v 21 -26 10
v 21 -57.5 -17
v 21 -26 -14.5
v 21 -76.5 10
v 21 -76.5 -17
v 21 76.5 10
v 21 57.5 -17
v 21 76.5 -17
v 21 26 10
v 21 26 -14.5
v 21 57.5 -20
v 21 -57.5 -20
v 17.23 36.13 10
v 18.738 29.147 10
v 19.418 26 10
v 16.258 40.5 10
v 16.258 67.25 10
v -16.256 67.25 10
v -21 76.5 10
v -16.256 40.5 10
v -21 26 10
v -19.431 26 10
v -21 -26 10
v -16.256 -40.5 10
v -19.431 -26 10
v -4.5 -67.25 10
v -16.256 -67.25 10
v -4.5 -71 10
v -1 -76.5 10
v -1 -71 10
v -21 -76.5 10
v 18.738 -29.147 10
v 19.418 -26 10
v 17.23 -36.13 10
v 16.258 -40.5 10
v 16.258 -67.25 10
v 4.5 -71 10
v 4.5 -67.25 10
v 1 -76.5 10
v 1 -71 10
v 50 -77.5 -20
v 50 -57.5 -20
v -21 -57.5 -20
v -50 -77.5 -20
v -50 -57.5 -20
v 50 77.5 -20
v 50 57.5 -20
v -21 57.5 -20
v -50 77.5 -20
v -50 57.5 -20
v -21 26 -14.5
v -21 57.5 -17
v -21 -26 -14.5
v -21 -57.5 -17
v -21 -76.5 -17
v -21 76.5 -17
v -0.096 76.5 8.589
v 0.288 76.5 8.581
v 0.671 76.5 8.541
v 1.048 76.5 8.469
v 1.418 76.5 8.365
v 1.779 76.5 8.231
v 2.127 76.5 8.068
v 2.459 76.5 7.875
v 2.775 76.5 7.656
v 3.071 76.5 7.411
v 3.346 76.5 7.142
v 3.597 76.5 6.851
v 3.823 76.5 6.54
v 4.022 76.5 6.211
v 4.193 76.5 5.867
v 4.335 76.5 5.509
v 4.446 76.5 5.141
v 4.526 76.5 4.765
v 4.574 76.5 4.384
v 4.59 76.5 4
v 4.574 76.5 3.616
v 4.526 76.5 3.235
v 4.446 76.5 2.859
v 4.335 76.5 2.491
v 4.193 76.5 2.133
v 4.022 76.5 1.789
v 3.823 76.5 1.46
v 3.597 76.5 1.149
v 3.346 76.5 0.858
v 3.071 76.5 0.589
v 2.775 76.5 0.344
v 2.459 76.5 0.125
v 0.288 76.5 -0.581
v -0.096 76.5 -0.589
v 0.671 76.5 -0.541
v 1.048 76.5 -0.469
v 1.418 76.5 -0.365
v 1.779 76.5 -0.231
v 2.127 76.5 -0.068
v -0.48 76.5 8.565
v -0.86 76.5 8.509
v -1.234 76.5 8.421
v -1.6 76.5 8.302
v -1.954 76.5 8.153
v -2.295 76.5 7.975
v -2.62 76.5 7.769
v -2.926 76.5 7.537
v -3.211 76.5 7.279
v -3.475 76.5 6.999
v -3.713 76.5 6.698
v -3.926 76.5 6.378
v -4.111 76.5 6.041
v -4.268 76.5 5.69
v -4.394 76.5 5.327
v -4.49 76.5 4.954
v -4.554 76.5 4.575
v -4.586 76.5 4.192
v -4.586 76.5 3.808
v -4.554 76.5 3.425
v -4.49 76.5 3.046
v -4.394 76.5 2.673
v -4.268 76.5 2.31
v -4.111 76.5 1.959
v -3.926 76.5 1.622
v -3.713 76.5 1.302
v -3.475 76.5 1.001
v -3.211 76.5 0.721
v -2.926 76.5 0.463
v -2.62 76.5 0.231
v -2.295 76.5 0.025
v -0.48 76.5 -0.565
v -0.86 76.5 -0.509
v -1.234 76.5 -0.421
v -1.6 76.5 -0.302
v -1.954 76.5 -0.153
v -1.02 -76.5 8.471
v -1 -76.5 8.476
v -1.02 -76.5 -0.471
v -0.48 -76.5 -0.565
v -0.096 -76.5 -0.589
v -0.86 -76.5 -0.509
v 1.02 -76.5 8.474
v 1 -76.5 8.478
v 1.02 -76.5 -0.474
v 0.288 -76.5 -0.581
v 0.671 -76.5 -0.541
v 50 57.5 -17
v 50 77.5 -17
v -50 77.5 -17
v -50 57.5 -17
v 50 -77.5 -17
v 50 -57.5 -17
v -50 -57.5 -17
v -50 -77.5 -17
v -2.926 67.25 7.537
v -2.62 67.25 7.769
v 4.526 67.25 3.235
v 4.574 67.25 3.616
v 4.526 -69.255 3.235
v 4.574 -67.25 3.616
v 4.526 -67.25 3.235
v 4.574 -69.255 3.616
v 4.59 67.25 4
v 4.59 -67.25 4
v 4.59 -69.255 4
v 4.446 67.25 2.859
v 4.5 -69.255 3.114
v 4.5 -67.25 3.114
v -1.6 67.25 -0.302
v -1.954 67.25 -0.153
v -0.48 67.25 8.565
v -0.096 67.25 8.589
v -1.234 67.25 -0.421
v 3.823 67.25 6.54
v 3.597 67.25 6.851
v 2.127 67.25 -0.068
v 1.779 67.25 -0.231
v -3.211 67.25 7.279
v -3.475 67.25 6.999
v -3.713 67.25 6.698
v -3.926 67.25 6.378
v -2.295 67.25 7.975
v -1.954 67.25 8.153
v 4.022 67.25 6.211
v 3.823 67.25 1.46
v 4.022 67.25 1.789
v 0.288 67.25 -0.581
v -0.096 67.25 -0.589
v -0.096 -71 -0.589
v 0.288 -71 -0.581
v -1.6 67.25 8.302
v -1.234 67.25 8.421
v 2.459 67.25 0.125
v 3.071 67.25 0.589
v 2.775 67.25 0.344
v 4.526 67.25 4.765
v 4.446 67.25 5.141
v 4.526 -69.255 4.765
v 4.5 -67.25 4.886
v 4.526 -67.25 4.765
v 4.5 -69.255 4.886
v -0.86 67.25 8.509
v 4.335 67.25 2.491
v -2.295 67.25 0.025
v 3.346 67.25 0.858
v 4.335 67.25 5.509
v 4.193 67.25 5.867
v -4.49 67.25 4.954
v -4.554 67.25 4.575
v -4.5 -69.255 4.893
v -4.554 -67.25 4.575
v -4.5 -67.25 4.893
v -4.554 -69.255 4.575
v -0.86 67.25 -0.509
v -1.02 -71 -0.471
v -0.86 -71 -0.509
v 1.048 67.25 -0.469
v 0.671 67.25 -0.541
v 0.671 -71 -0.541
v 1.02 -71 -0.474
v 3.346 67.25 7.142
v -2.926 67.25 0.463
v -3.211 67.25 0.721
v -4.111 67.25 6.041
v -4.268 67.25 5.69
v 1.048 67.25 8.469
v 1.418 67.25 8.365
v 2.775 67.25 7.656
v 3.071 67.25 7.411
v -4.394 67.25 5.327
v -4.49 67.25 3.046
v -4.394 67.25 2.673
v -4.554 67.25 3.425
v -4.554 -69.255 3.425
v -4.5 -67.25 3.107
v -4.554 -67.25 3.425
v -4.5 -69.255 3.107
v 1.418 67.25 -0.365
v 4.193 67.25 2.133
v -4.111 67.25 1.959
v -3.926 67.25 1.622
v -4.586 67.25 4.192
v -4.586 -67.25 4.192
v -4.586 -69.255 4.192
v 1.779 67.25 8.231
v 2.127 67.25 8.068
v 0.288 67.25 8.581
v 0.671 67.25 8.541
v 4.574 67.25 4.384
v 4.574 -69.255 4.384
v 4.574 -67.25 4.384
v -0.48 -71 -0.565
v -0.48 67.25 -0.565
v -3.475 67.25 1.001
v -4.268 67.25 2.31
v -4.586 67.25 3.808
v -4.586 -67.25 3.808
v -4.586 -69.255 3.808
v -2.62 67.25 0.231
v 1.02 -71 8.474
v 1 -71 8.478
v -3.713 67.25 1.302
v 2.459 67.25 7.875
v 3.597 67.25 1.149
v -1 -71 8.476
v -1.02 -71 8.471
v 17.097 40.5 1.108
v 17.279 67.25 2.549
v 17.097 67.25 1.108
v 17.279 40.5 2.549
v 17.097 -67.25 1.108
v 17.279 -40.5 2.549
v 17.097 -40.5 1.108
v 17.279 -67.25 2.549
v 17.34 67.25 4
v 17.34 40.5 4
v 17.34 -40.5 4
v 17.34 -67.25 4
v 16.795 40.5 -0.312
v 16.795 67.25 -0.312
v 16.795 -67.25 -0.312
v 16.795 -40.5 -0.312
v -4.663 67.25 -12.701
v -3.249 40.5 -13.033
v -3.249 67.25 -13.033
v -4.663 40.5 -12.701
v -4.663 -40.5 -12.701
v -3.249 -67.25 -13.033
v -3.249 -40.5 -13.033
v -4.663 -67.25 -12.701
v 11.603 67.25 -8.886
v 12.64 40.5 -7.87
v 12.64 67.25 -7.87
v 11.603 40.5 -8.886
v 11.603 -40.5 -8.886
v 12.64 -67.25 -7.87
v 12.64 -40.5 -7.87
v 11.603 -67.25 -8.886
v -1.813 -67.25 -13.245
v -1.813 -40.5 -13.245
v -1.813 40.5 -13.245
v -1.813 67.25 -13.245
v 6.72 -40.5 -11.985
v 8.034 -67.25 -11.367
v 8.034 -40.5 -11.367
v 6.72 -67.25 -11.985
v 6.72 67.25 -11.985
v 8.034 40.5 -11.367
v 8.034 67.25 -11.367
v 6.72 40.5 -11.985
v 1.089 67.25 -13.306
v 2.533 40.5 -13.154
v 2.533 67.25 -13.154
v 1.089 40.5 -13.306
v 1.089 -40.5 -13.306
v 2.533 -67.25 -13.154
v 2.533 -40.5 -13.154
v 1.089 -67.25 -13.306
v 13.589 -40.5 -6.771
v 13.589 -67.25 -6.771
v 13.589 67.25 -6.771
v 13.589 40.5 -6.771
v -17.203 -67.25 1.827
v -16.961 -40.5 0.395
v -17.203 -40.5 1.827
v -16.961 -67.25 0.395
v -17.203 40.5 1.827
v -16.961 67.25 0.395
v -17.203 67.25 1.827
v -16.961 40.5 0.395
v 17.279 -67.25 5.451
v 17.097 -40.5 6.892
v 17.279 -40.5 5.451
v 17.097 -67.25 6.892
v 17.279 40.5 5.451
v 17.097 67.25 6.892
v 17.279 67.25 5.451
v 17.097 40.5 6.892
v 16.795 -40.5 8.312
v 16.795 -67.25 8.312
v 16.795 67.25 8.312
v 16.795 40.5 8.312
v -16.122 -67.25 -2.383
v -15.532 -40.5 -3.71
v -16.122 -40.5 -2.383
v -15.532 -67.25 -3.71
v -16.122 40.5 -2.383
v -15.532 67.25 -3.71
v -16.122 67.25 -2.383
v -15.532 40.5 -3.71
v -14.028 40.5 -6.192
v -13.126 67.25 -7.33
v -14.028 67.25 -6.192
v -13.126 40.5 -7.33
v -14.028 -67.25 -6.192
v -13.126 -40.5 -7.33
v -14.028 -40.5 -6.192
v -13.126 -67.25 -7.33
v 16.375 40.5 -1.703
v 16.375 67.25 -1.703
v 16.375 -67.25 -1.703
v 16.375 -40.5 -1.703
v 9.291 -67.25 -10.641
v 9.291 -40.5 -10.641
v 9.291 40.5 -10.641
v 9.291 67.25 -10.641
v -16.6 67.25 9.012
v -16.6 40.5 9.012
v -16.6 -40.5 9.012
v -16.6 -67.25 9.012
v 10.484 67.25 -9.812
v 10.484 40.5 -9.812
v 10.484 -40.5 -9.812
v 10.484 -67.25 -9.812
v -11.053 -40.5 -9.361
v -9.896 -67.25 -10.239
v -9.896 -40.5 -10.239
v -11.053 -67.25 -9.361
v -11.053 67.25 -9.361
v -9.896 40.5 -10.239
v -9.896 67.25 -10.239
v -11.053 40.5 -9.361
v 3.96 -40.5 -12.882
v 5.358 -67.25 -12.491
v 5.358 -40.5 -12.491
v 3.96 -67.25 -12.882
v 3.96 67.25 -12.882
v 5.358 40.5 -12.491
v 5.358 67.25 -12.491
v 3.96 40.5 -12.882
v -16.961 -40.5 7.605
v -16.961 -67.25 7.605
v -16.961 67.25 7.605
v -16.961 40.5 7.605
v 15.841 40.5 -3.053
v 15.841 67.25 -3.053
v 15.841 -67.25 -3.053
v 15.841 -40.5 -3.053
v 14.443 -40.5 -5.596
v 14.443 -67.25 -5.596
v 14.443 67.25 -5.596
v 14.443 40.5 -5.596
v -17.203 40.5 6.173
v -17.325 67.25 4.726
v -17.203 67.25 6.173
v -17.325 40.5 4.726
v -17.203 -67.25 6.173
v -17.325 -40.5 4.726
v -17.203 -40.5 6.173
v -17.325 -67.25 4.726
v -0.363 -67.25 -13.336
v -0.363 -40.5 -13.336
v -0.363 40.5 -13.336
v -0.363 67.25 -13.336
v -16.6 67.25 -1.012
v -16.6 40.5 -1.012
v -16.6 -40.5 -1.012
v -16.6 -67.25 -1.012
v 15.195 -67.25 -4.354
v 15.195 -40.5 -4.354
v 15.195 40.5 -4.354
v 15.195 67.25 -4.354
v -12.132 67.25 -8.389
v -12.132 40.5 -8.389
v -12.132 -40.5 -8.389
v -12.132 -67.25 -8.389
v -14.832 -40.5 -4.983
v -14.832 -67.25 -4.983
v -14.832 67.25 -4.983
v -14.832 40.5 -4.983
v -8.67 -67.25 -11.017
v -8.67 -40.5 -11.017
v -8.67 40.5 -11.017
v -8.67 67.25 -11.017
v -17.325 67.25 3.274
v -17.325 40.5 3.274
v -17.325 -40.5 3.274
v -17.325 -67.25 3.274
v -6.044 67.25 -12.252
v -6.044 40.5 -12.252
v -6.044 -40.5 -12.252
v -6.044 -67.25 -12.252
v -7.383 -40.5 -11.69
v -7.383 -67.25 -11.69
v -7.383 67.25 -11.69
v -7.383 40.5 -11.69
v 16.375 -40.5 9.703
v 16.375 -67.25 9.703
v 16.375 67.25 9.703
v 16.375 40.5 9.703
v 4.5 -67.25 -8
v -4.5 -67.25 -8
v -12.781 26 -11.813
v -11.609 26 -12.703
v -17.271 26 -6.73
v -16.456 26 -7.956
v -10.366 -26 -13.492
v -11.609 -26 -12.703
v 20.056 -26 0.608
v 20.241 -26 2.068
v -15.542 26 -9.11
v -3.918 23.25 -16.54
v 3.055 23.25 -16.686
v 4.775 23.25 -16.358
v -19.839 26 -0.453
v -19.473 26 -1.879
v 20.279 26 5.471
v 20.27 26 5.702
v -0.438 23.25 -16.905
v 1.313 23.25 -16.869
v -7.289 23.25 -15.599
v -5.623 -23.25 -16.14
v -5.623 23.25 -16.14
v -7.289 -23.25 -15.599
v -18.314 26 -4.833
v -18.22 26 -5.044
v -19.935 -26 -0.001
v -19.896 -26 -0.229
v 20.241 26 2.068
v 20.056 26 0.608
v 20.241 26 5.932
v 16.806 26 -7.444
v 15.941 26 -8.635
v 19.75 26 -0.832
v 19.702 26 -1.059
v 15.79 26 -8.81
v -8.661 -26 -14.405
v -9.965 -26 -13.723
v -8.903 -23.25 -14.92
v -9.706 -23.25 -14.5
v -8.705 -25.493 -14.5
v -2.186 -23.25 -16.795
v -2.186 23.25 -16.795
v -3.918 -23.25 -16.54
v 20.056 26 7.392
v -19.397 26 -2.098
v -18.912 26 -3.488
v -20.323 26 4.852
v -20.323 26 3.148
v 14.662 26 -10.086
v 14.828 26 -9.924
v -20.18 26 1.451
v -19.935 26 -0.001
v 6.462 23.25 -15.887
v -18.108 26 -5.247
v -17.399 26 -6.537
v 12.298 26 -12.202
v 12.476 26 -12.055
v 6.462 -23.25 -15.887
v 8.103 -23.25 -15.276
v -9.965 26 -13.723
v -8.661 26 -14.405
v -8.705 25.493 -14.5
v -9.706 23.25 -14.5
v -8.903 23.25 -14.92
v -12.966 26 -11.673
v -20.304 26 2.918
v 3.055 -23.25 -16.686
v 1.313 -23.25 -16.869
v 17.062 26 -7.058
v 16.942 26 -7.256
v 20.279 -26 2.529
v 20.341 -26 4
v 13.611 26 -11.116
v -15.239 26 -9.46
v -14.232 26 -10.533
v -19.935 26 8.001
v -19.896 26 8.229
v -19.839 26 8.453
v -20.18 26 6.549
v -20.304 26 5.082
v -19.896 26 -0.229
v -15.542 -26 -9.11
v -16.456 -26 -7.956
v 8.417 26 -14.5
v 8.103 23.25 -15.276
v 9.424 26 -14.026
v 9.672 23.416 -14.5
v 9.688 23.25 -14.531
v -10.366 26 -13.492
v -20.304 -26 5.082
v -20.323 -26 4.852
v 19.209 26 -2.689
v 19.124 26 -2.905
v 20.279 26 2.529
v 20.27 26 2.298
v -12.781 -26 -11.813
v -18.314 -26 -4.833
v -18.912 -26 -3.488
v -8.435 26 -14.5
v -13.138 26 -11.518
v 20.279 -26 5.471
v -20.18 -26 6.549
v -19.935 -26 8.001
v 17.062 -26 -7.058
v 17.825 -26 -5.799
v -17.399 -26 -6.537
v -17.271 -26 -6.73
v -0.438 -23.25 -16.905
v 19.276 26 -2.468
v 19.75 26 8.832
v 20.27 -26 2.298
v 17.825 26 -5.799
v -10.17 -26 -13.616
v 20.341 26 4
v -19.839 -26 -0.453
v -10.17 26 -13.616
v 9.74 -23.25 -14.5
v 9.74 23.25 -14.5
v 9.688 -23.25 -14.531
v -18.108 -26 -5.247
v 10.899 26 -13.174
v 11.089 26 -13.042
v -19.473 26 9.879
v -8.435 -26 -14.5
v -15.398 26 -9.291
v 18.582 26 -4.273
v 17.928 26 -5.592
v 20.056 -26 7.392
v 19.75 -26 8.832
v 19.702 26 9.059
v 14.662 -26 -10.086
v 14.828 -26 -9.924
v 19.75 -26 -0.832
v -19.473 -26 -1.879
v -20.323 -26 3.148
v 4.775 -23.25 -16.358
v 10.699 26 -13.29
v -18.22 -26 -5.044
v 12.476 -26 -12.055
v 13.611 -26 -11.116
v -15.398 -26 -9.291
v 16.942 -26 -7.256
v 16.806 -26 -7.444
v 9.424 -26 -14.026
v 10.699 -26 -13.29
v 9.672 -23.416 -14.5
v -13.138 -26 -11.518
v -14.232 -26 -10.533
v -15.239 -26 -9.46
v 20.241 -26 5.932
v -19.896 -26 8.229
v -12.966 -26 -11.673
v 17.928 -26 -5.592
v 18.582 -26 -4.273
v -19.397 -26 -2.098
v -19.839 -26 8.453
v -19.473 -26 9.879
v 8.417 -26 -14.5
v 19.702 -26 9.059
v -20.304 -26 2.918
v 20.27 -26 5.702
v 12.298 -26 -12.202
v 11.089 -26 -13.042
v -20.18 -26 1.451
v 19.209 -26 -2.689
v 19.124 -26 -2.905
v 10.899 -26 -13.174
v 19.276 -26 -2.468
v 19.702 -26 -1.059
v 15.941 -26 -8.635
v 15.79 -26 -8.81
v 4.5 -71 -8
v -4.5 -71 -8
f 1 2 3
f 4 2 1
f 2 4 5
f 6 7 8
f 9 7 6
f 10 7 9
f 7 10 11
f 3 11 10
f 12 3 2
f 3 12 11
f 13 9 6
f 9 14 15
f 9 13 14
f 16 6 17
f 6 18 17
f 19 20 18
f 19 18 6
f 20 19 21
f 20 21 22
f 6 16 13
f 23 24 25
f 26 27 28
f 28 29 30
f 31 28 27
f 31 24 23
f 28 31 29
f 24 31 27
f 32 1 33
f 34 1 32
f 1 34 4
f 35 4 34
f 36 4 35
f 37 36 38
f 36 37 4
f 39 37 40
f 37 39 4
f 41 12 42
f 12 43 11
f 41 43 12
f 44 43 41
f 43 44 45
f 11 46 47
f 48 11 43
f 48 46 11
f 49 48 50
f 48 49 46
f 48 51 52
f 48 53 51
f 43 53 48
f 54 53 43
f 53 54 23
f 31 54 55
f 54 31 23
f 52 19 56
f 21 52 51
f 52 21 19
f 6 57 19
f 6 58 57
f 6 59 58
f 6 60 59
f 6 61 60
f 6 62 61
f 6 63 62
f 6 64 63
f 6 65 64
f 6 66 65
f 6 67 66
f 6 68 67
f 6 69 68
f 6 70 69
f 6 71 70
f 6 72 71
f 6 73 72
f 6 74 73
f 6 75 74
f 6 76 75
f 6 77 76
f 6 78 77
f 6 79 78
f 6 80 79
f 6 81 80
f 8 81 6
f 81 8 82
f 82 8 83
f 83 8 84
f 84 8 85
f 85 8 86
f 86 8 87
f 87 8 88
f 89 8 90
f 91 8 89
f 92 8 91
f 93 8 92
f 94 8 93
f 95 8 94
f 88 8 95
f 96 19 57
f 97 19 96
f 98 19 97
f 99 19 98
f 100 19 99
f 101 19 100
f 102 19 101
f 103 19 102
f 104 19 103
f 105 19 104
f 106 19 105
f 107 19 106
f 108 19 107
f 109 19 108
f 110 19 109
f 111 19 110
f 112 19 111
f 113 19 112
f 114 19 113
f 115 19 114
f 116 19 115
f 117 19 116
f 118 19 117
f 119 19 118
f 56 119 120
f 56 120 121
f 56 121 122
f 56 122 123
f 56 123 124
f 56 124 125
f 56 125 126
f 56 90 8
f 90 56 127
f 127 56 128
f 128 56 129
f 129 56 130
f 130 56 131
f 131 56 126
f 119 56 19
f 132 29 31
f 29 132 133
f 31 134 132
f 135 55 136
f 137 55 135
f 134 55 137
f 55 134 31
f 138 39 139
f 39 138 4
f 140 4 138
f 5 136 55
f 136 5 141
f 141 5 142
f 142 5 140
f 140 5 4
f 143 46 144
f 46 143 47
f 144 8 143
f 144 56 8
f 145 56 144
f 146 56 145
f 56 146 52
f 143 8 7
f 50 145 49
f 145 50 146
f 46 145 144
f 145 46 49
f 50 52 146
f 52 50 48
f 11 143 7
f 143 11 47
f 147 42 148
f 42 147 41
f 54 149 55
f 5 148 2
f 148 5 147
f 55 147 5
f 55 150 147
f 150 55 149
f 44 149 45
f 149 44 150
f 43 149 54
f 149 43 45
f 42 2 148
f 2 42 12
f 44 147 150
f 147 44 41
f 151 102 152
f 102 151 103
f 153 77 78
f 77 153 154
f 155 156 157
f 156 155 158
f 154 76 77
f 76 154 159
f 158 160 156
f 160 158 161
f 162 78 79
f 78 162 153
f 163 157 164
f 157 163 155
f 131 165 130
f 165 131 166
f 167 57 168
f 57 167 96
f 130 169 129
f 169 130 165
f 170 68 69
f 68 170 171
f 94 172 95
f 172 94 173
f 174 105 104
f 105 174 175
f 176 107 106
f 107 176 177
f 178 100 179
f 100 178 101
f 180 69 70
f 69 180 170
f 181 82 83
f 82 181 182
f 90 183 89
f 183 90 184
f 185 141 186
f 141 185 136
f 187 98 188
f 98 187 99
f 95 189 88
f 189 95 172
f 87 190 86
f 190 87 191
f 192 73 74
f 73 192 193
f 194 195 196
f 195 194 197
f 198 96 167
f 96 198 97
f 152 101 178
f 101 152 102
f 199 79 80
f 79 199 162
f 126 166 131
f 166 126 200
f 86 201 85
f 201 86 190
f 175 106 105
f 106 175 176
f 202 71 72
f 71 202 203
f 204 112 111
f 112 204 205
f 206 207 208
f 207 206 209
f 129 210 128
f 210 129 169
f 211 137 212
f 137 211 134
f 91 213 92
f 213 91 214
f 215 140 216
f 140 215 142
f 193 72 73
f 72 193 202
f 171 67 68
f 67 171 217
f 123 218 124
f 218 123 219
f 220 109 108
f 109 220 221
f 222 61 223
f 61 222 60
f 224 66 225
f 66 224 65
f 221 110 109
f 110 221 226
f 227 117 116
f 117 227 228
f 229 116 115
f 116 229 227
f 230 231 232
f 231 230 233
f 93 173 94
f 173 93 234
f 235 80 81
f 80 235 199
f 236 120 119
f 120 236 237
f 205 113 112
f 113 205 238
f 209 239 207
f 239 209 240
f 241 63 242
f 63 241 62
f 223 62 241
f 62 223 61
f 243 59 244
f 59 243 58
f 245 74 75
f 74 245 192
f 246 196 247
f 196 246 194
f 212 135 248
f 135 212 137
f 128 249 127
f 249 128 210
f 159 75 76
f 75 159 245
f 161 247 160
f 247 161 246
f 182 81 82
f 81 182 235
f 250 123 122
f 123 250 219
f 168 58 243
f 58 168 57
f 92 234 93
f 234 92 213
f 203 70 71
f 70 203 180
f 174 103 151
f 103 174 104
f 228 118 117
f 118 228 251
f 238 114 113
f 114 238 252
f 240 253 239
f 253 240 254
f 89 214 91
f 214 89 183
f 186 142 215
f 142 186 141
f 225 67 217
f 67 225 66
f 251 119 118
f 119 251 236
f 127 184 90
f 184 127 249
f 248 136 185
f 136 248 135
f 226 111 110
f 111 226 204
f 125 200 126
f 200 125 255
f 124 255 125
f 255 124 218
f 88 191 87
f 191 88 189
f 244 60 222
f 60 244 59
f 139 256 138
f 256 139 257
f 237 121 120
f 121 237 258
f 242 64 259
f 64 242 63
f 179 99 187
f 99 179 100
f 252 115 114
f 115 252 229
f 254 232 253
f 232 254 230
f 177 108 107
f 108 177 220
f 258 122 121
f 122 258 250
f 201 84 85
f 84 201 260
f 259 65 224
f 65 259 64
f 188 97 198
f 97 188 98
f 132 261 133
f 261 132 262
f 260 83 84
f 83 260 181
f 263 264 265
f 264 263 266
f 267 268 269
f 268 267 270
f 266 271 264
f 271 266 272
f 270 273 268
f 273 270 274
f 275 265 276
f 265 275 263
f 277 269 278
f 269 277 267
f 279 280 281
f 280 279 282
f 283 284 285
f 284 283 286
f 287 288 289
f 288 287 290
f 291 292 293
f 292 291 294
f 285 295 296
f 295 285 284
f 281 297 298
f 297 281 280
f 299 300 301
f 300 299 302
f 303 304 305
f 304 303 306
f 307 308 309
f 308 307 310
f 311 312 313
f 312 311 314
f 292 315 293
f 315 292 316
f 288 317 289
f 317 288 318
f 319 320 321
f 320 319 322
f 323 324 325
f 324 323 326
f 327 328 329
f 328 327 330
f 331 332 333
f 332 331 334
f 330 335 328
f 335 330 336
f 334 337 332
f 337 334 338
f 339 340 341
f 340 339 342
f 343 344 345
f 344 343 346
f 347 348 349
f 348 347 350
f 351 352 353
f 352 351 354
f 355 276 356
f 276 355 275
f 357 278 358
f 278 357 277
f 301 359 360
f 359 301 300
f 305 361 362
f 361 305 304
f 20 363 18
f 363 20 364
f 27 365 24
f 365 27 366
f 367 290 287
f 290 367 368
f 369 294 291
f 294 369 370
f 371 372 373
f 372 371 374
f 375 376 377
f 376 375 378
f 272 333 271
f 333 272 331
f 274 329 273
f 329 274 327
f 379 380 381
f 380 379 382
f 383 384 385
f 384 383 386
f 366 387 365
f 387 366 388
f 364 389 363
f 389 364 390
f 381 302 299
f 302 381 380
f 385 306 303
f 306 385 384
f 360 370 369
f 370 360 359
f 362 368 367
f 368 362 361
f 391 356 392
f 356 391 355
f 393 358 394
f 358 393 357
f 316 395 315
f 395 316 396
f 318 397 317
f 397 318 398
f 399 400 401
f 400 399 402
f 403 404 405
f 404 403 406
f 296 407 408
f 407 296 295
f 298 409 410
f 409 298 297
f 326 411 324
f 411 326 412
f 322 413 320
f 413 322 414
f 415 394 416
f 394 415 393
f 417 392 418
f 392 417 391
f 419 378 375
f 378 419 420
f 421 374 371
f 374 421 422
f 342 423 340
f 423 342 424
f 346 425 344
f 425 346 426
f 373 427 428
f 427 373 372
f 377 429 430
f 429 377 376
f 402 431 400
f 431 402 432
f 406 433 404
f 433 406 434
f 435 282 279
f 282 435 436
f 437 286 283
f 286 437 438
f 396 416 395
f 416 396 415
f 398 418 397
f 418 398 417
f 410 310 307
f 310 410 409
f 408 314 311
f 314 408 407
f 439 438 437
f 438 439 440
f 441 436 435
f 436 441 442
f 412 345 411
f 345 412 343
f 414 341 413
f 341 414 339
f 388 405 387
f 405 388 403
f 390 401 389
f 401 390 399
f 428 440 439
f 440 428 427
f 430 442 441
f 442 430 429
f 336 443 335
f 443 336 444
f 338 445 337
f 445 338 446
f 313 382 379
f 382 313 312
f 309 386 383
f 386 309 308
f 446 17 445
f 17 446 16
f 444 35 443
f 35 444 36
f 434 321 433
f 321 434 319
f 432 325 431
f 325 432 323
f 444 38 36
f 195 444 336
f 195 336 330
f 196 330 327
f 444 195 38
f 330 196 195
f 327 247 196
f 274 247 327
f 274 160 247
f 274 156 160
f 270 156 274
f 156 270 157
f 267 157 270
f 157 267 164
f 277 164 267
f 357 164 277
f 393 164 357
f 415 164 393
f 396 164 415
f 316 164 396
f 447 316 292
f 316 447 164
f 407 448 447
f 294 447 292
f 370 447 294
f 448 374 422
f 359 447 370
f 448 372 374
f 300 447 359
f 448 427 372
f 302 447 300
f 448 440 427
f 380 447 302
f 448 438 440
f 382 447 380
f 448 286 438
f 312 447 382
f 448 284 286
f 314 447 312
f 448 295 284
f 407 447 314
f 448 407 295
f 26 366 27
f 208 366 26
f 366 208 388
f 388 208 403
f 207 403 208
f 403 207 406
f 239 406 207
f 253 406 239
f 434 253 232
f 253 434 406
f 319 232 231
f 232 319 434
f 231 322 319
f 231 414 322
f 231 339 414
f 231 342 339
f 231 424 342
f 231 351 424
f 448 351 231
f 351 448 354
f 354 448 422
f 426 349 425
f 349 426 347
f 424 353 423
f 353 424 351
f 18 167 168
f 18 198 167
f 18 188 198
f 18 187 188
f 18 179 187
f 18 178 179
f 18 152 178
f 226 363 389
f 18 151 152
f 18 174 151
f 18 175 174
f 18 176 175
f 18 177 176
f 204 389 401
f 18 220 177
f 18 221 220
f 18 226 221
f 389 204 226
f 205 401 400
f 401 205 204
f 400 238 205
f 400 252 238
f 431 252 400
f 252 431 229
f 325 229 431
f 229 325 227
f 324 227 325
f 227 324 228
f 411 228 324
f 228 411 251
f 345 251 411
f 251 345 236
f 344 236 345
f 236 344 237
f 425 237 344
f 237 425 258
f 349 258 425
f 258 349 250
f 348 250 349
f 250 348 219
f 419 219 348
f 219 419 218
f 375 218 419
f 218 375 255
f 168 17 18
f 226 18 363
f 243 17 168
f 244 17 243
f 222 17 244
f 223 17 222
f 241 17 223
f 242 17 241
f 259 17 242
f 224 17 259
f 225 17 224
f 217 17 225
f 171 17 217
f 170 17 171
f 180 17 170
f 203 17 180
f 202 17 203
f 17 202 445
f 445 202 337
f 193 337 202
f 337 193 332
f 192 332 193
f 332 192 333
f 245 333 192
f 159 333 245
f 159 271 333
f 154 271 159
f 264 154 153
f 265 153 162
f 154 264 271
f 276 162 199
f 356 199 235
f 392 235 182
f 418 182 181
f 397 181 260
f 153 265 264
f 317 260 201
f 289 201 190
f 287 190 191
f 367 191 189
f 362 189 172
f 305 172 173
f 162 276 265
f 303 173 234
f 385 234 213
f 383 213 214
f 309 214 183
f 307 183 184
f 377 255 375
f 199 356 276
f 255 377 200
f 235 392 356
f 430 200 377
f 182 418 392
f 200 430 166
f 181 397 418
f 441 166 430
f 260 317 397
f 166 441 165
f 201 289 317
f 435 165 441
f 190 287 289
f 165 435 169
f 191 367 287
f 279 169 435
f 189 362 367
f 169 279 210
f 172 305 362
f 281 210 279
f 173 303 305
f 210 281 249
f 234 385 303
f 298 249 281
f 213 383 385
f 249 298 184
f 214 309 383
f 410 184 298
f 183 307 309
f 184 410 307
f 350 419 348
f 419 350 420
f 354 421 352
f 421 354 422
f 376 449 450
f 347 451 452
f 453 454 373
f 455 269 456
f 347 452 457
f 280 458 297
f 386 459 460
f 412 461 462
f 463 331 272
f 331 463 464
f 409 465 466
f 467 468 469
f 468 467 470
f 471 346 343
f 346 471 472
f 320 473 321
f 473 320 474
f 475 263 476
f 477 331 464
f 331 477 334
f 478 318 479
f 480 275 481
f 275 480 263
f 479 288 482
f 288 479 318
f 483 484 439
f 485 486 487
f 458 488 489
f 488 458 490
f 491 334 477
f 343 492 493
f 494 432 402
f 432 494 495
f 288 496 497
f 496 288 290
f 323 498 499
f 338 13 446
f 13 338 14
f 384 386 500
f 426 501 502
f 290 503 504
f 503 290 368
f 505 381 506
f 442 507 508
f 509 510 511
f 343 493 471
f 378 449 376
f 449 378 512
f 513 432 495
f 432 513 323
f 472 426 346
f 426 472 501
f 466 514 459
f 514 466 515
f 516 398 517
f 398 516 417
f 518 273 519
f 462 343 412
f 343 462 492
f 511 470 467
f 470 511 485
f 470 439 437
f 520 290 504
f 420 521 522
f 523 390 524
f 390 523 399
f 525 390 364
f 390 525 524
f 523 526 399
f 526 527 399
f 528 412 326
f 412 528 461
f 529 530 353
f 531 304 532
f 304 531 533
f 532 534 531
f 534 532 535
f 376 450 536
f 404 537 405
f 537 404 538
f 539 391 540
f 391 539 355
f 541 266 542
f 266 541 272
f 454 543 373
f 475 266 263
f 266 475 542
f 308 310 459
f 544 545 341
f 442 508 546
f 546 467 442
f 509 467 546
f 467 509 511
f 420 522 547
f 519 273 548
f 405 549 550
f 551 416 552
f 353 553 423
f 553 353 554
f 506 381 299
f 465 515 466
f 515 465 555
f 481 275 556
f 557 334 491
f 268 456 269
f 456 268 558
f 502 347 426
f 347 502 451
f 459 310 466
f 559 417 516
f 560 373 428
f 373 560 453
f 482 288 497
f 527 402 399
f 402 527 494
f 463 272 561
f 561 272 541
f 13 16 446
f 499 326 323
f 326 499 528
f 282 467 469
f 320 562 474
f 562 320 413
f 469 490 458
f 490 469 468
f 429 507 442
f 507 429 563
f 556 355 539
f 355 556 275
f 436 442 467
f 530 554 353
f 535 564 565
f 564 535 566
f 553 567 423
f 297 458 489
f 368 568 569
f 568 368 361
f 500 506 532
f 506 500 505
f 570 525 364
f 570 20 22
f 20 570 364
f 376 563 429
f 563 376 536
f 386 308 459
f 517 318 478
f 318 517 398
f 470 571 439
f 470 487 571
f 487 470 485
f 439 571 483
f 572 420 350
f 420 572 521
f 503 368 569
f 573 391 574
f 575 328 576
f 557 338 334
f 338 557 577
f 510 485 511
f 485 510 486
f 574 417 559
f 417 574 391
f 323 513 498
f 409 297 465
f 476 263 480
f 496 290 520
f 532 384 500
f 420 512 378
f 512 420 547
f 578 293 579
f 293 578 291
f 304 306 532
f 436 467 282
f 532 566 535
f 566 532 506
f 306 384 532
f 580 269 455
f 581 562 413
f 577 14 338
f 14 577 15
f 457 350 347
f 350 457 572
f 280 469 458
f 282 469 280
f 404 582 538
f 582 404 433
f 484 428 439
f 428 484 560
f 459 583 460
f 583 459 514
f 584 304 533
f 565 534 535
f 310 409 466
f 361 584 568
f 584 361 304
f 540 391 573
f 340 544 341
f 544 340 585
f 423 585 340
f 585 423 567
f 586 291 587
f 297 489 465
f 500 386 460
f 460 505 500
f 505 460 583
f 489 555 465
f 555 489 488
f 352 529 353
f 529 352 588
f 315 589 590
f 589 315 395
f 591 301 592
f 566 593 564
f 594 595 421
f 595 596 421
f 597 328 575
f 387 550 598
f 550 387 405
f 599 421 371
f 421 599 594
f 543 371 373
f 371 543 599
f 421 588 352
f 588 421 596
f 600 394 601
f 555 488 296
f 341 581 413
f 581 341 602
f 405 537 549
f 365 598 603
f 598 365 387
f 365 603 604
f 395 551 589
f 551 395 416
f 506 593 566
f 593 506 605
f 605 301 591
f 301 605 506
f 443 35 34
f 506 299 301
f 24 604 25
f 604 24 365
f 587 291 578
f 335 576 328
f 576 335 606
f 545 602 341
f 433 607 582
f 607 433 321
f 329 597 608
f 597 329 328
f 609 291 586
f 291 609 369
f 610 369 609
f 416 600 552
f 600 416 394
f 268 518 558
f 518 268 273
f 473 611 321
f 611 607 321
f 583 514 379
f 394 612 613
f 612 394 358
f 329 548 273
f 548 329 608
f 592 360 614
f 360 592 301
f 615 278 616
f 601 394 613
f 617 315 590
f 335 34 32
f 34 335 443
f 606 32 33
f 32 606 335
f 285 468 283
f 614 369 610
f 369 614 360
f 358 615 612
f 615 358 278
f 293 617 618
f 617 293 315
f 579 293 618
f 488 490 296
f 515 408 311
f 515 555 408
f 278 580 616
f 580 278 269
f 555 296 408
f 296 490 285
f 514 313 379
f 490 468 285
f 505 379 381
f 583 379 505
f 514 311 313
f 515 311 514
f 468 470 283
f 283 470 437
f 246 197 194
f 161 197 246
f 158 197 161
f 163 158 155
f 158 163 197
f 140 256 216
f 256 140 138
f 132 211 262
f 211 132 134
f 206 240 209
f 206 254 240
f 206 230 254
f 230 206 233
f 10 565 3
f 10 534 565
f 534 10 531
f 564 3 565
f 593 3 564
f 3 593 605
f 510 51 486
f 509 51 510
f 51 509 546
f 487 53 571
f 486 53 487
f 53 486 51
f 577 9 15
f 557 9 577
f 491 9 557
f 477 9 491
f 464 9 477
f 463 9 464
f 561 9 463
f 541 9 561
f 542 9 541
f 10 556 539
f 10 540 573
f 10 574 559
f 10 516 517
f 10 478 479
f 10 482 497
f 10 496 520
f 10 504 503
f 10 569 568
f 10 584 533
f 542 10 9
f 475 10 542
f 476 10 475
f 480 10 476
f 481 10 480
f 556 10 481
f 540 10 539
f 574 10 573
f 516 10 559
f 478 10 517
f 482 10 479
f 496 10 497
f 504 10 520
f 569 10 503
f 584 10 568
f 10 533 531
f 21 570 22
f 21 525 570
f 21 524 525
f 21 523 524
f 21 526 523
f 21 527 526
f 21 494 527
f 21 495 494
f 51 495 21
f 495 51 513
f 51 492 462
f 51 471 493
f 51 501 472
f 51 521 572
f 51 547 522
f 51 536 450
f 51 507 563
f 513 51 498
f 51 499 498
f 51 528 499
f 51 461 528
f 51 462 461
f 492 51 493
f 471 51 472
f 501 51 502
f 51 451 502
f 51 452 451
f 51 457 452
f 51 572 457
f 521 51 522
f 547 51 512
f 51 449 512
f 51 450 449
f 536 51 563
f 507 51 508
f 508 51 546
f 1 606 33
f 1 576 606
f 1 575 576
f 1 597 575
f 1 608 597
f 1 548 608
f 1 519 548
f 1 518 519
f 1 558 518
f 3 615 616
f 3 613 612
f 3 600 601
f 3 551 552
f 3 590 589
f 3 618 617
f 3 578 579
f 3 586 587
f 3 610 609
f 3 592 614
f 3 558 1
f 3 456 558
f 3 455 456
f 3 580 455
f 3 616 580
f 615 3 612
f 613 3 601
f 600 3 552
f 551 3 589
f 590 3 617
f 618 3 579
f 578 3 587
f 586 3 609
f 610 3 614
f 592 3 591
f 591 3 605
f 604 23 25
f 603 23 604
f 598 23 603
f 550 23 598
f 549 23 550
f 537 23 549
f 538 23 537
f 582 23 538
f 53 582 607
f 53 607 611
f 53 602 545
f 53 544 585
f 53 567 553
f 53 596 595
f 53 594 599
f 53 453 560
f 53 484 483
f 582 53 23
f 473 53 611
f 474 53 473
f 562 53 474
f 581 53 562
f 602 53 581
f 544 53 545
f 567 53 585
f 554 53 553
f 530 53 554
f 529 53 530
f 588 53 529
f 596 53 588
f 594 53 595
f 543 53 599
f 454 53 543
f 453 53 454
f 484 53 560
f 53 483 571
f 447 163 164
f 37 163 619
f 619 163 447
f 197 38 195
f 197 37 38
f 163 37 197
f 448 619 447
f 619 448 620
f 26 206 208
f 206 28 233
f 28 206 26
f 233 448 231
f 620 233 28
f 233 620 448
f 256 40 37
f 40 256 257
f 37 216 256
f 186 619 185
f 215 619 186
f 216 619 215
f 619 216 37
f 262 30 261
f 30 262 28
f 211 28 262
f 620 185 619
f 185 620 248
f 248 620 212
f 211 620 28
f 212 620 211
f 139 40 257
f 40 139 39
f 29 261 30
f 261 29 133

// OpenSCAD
// file: Aloka_303D_model v0.scad
$fn=75;

module aloka(){
difference(){
//union(){
    union(){
        difference(){
            union(){
                color("Blue")translate([0,0,0]) cylinder(d=9,h=134.4+10+10,center=true);//piny
                color("Blue")translate([0,0,0]) cylinder(d=34,h=134.5,center=true);//patice
            }//union
            translate([0,0,0]) cylinder(d=41,h=81,center=true);//tělo
        }//diff
        color("Lavender",alpha=0.5) hull(){
            color()translate([0,0,0]) cylinder(d=34,h=81,center=true);//patice
            color()translate([0,0,0]) cylinder(d=41,h=46.5,center=true);//tělo
        }//hull
    }//union
    color("Red")union(){
        translate([+6.0,0,2+(134.51+10)/2]) cube(10, center=true);
        translate([-6.0,0,2+(134.51+10)/2]) cube(10, center=true);//piny
        }//union
}//difference
}//module
//aloka();
// main file
use <Aloka_303D_model v0.scad>;

module stojan_ingot(){
    translate([0,0,-5]) cube([42,-2+135+10+10,30], center=true);
    translate([0,-10+0.5*(135+10+10),-18.5]) cube([100,20,3], center=true);
    translate([0,10-0.5*(135+10+10),-18.5]) cube([100,20,3], center=true);
}//module


module stojan_raw(){
    difference(){
        stojan_ingot();
        translate([0,0,+4]) mirror([0,45,45]) scale([1.02,1.02,1]) aloka();
    }//diff
}//module


module stojan(){
    difference(){
    //union(){
        stojan_raw();
        union(){
            color("Red") translate([0,0,6]) cube([42,52,41], center=true);
            color("Red") translate([0,-69,22]) cube([9,4,60],center=true);
            color("Red") translate([0,-73,22]) cube([2,9,30],center=true);
            }//union
    }//diff
    
    }//module
stojan();
//stojan_raw();
